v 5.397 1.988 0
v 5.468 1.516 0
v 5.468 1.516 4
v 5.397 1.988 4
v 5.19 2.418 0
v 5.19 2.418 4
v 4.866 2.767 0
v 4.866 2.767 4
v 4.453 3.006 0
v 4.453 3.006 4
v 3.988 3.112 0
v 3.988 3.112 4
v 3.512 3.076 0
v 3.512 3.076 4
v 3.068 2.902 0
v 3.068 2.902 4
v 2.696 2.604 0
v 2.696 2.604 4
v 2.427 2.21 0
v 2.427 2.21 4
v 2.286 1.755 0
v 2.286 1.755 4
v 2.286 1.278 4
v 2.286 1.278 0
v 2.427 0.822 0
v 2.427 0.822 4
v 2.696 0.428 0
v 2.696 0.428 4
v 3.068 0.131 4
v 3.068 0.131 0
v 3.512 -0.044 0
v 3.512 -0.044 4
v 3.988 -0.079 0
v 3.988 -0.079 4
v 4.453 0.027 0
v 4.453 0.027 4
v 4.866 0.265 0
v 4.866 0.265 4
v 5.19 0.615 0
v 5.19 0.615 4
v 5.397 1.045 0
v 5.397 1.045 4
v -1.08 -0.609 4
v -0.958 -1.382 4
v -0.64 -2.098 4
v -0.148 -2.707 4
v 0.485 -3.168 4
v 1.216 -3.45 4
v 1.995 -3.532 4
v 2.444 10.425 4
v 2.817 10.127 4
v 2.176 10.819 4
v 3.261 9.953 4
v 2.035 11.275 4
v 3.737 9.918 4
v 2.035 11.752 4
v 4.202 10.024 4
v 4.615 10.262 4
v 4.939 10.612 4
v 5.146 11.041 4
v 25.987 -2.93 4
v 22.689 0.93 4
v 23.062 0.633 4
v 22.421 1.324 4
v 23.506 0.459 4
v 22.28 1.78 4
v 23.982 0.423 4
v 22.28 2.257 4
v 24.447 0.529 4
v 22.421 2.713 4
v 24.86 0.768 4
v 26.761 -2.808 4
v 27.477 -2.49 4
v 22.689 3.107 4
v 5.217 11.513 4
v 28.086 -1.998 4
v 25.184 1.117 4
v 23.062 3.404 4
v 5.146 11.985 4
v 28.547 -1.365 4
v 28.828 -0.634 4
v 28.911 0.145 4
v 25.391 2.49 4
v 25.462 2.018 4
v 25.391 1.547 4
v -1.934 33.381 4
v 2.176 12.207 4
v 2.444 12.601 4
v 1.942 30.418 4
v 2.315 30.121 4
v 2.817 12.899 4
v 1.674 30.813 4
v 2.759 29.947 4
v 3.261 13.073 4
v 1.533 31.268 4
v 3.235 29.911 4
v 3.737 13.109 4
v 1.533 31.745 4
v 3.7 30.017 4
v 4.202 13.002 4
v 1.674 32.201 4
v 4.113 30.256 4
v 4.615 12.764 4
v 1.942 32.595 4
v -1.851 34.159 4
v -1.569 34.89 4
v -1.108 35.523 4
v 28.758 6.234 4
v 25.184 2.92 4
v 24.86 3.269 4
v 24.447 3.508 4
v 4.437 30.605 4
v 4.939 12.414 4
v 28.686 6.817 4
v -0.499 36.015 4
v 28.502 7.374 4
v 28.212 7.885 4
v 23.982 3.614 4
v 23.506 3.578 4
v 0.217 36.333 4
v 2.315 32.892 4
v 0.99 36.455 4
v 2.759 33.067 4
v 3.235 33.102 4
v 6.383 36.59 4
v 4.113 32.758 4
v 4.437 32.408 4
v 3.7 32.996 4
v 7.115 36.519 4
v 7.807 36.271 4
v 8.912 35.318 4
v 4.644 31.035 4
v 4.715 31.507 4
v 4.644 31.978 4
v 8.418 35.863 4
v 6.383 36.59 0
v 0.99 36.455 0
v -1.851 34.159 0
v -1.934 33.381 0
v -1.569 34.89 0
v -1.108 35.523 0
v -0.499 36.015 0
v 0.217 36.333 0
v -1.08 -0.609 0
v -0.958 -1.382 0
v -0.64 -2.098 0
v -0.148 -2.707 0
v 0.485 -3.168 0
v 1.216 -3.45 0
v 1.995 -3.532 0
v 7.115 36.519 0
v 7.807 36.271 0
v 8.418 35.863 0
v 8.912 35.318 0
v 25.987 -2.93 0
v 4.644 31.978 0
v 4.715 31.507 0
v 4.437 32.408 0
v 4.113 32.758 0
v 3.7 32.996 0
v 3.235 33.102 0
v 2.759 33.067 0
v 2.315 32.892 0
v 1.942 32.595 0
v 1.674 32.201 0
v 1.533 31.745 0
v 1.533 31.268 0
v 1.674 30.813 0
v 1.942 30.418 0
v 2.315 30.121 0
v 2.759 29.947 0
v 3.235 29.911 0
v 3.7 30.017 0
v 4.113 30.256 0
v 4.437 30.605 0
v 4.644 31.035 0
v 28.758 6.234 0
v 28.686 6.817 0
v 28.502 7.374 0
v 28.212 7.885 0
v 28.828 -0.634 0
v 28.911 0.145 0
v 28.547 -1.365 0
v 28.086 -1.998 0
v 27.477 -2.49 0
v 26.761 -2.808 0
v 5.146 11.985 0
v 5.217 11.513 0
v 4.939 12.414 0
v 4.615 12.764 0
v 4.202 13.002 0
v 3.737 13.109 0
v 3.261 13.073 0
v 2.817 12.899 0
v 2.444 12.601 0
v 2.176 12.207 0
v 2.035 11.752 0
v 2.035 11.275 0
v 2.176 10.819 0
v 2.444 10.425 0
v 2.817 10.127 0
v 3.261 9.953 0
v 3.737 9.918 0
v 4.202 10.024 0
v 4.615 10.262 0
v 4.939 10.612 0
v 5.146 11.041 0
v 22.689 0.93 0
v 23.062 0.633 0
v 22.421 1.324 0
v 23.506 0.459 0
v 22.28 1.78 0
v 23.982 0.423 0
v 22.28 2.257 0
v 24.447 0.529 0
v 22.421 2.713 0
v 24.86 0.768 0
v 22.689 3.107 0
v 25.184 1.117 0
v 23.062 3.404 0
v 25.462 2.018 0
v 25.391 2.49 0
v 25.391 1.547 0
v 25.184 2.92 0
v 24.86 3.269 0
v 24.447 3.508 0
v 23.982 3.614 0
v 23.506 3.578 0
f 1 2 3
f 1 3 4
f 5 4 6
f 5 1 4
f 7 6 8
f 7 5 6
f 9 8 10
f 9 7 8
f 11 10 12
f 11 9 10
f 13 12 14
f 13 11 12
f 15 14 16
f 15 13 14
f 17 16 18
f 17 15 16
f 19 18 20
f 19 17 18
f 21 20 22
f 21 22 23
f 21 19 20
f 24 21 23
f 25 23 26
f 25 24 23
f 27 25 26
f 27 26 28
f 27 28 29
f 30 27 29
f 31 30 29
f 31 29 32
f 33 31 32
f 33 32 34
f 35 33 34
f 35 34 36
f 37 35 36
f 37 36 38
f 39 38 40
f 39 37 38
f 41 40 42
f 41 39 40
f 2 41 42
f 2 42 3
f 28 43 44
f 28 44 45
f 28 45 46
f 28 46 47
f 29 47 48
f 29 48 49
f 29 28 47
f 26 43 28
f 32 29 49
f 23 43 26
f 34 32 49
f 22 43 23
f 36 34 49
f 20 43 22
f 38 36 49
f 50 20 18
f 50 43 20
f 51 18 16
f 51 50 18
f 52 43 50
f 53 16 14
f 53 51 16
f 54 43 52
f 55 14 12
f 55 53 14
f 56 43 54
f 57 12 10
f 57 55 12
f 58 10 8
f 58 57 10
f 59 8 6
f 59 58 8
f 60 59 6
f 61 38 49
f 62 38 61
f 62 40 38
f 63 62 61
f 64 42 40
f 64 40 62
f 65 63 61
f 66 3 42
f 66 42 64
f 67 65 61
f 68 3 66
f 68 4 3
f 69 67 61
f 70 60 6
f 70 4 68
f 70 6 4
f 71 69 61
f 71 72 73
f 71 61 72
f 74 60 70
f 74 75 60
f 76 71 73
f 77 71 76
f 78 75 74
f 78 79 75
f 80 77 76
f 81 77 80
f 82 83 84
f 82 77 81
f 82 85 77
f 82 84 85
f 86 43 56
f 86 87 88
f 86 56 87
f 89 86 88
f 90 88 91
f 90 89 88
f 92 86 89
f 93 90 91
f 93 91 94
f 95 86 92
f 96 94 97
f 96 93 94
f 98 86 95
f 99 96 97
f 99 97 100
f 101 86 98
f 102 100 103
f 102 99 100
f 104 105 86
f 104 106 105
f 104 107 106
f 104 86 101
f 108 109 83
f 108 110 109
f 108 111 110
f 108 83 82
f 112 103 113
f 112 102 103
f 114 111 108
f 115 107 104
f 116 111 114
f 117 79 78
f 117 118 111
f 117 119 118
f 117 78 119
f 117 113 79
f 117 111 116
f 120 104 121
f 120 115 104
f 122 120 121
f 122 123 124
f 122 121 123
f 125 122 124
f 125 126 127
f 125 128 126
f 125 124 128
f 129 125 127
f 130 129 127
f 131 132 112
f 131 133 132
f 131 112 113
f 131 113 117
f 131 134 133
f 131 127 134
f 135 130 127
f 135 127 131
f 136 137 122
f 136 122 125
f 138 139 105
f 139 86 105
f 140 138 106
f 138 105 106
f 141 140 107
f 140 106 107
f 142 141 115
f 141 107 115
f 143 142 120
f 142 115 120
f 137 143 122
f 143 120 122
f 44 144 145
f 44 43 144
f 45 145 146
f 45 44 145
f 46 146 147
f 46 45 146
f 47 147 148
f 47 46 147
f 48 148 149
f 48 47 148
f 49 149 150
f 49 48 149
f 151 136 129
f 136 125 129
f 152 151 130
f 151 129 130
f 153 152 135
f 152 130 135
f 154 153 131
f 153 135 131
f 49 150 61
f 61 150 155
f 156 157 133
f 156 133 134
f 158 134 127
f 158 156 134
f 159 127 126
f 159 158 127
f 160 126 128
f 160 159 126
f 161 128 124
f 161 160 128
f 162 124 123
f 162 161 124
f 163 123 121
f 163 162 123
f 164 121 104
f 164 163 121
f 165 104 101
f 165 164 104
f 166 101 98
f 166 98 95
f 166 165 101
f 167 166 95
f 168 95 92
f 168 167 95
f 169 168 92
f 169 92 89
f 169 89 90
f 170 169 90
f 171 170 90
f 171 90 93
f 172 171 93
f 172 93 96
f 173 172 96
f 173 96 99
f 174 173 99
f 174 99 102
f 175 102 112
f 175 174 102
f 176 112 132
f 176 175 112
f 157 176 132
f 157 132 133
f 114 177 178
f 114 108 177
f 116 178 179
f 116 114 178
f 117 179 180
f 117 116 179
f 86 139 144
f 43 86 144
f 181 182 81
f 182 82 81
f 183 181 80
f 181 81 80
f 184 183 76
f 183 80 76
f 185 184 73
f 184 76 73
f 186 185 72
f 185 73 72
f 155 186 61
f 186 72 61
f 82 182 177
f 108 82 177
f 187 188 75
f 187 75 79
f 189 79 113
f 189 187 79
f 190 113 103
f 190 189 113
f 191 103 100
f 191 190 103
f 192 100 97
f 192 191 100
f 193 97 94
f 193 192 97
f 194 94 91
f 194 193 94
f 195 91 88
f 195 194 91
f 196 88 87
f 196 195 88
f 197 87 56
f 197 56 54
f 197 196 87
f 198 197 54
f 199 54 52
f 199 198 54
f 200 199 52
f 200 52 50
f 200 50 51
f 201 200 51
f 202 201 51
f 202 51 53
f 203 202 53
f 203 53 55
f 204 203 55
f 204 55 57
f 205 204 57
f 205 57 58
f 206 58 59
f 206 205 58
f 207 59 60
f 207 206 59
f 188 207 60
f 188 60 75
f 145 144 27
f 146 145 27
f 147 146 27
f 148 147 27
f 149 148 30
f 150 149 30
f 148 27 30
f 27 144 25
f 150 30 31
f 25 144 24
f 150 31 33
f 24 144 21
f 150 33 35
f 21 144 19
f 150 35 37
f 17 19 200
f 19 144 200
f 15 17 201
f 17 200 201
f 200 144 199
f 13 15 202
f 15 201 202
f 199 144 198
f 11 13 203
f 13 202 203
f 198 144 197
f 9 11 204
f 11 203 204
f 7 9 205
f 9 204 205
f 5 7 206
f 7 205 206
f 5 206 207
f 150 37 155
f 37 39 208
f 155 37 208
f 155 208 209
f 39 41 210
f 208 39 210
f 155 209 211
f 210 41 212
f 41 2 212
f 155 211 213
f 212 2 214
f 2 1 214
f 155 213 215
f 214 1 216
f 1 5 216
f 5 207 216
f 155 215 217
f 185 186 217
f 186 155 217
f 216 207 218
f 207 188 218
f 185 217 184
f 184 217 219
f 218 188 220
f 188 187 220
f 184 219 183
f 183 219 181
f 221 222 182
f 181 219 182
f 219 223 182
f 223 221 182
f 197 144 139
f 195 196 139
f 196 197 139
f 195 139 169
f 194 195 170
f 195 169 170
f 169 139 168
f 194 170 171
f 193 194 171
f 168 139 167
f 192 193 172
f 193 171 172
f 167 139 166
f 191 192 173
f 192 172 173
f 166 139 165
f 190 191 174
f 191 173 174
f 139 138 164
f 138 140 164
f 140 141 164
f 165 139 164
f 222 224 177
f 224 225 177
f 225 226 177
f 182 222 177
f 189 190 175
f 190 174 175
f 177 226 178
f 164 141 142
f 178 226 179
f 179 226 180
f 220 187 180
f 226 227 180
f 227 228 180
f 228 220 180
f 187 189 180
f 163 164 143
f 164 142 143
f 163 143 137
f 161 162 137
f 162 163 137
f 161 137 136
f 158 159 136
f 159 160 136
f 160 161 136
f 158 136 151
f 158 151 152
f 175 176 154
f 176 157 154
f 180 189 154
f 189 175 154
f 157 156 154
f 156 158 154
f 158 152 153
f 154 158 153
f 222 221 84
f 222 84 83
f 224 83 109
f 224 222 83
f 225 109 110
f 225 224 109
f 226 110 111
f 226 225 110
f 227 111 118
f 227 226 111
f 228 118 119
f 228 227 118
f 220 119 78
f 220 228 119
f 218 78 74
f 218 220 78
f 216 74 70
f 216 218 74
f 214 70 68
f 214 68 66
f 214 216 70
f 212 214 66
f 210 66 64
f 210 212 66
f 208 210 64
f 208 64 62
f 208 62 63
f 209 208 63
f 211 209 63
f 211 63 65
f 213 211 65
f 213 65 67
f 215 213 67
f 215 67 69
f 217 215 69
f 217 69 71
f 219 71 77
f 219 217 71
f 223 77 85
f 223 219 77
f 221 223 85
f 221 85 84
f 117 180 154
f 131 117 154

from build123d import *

# Parameters (mm, degrees)
SKETCH1_R           = 1.6
BOSS_EXTRUDE1_DEPTH = 4
FILLET2_R           = 3


with BuildPart() as part:
    # Sketch1 → Boss-Extrude1 (new body)
    # profile 1 of 3: a face of its own
    with BuildSketch(Plane.XY):
        Polygon((-2.008891974, 36.379591132), (7.987954355, 36.630715556), (8.741327627, 6.640176569), (-1.255518702, 6.389052145), align=None)
        with Locations((3.617342251, 11.513037521)):
            Circle(SKETCH1_R, mode=Mode.SUBTRACT)
        with Locations((3.115093403, 31.506730179)):
            Circle(SKETCH1_R, mode=Mode.SUBTRACT)
    # profile 2 of 3: a face of its own
    with BuildSketch(Plane.XY):
        Polygon((28.735020285, 7.142425417), (7.987954355, 36.630715556), (8.741327627, 6.640176569), align=None)
    # profile 3 of 3: a face of its own
    with BuildSketch(Plane.XY):
        Polygon((28.986144709, -2.854420912), (28.735020285, 7.142425417), (8.741327627, 6.640176569), (-1.255518702, 6.389052145), (-1.004394278, -3.607794184), align=None)
        with Locations((3.868466675, 1.516191192)):
            Circle(SKETCH1_R, mode=Mode.SUBTRACT)
        with Locations((23.862159332, 2.018440041)):
            Circle(SKETCH1_R, mode=Mode.SUBTRACT)
    extrude(amount=BOSS_EXTRUDE1_DEPTH)

    # Fillet2
    fillet2_edges = [part.edges().sort_by_distance(p)[0] for p in [
        (28.986144709, -2.854420912, 2),
        (-1.004394278, -3.607794184, 2),
        (-2.008891974, 36.379591132, 2),
        (7.987954355, 36.630715556, 2),
        (28.735020285, 7.142425417, 2),
    ]]
    fillet(fillet2_edges, radius=FILLET2_R)


solid = part.part
